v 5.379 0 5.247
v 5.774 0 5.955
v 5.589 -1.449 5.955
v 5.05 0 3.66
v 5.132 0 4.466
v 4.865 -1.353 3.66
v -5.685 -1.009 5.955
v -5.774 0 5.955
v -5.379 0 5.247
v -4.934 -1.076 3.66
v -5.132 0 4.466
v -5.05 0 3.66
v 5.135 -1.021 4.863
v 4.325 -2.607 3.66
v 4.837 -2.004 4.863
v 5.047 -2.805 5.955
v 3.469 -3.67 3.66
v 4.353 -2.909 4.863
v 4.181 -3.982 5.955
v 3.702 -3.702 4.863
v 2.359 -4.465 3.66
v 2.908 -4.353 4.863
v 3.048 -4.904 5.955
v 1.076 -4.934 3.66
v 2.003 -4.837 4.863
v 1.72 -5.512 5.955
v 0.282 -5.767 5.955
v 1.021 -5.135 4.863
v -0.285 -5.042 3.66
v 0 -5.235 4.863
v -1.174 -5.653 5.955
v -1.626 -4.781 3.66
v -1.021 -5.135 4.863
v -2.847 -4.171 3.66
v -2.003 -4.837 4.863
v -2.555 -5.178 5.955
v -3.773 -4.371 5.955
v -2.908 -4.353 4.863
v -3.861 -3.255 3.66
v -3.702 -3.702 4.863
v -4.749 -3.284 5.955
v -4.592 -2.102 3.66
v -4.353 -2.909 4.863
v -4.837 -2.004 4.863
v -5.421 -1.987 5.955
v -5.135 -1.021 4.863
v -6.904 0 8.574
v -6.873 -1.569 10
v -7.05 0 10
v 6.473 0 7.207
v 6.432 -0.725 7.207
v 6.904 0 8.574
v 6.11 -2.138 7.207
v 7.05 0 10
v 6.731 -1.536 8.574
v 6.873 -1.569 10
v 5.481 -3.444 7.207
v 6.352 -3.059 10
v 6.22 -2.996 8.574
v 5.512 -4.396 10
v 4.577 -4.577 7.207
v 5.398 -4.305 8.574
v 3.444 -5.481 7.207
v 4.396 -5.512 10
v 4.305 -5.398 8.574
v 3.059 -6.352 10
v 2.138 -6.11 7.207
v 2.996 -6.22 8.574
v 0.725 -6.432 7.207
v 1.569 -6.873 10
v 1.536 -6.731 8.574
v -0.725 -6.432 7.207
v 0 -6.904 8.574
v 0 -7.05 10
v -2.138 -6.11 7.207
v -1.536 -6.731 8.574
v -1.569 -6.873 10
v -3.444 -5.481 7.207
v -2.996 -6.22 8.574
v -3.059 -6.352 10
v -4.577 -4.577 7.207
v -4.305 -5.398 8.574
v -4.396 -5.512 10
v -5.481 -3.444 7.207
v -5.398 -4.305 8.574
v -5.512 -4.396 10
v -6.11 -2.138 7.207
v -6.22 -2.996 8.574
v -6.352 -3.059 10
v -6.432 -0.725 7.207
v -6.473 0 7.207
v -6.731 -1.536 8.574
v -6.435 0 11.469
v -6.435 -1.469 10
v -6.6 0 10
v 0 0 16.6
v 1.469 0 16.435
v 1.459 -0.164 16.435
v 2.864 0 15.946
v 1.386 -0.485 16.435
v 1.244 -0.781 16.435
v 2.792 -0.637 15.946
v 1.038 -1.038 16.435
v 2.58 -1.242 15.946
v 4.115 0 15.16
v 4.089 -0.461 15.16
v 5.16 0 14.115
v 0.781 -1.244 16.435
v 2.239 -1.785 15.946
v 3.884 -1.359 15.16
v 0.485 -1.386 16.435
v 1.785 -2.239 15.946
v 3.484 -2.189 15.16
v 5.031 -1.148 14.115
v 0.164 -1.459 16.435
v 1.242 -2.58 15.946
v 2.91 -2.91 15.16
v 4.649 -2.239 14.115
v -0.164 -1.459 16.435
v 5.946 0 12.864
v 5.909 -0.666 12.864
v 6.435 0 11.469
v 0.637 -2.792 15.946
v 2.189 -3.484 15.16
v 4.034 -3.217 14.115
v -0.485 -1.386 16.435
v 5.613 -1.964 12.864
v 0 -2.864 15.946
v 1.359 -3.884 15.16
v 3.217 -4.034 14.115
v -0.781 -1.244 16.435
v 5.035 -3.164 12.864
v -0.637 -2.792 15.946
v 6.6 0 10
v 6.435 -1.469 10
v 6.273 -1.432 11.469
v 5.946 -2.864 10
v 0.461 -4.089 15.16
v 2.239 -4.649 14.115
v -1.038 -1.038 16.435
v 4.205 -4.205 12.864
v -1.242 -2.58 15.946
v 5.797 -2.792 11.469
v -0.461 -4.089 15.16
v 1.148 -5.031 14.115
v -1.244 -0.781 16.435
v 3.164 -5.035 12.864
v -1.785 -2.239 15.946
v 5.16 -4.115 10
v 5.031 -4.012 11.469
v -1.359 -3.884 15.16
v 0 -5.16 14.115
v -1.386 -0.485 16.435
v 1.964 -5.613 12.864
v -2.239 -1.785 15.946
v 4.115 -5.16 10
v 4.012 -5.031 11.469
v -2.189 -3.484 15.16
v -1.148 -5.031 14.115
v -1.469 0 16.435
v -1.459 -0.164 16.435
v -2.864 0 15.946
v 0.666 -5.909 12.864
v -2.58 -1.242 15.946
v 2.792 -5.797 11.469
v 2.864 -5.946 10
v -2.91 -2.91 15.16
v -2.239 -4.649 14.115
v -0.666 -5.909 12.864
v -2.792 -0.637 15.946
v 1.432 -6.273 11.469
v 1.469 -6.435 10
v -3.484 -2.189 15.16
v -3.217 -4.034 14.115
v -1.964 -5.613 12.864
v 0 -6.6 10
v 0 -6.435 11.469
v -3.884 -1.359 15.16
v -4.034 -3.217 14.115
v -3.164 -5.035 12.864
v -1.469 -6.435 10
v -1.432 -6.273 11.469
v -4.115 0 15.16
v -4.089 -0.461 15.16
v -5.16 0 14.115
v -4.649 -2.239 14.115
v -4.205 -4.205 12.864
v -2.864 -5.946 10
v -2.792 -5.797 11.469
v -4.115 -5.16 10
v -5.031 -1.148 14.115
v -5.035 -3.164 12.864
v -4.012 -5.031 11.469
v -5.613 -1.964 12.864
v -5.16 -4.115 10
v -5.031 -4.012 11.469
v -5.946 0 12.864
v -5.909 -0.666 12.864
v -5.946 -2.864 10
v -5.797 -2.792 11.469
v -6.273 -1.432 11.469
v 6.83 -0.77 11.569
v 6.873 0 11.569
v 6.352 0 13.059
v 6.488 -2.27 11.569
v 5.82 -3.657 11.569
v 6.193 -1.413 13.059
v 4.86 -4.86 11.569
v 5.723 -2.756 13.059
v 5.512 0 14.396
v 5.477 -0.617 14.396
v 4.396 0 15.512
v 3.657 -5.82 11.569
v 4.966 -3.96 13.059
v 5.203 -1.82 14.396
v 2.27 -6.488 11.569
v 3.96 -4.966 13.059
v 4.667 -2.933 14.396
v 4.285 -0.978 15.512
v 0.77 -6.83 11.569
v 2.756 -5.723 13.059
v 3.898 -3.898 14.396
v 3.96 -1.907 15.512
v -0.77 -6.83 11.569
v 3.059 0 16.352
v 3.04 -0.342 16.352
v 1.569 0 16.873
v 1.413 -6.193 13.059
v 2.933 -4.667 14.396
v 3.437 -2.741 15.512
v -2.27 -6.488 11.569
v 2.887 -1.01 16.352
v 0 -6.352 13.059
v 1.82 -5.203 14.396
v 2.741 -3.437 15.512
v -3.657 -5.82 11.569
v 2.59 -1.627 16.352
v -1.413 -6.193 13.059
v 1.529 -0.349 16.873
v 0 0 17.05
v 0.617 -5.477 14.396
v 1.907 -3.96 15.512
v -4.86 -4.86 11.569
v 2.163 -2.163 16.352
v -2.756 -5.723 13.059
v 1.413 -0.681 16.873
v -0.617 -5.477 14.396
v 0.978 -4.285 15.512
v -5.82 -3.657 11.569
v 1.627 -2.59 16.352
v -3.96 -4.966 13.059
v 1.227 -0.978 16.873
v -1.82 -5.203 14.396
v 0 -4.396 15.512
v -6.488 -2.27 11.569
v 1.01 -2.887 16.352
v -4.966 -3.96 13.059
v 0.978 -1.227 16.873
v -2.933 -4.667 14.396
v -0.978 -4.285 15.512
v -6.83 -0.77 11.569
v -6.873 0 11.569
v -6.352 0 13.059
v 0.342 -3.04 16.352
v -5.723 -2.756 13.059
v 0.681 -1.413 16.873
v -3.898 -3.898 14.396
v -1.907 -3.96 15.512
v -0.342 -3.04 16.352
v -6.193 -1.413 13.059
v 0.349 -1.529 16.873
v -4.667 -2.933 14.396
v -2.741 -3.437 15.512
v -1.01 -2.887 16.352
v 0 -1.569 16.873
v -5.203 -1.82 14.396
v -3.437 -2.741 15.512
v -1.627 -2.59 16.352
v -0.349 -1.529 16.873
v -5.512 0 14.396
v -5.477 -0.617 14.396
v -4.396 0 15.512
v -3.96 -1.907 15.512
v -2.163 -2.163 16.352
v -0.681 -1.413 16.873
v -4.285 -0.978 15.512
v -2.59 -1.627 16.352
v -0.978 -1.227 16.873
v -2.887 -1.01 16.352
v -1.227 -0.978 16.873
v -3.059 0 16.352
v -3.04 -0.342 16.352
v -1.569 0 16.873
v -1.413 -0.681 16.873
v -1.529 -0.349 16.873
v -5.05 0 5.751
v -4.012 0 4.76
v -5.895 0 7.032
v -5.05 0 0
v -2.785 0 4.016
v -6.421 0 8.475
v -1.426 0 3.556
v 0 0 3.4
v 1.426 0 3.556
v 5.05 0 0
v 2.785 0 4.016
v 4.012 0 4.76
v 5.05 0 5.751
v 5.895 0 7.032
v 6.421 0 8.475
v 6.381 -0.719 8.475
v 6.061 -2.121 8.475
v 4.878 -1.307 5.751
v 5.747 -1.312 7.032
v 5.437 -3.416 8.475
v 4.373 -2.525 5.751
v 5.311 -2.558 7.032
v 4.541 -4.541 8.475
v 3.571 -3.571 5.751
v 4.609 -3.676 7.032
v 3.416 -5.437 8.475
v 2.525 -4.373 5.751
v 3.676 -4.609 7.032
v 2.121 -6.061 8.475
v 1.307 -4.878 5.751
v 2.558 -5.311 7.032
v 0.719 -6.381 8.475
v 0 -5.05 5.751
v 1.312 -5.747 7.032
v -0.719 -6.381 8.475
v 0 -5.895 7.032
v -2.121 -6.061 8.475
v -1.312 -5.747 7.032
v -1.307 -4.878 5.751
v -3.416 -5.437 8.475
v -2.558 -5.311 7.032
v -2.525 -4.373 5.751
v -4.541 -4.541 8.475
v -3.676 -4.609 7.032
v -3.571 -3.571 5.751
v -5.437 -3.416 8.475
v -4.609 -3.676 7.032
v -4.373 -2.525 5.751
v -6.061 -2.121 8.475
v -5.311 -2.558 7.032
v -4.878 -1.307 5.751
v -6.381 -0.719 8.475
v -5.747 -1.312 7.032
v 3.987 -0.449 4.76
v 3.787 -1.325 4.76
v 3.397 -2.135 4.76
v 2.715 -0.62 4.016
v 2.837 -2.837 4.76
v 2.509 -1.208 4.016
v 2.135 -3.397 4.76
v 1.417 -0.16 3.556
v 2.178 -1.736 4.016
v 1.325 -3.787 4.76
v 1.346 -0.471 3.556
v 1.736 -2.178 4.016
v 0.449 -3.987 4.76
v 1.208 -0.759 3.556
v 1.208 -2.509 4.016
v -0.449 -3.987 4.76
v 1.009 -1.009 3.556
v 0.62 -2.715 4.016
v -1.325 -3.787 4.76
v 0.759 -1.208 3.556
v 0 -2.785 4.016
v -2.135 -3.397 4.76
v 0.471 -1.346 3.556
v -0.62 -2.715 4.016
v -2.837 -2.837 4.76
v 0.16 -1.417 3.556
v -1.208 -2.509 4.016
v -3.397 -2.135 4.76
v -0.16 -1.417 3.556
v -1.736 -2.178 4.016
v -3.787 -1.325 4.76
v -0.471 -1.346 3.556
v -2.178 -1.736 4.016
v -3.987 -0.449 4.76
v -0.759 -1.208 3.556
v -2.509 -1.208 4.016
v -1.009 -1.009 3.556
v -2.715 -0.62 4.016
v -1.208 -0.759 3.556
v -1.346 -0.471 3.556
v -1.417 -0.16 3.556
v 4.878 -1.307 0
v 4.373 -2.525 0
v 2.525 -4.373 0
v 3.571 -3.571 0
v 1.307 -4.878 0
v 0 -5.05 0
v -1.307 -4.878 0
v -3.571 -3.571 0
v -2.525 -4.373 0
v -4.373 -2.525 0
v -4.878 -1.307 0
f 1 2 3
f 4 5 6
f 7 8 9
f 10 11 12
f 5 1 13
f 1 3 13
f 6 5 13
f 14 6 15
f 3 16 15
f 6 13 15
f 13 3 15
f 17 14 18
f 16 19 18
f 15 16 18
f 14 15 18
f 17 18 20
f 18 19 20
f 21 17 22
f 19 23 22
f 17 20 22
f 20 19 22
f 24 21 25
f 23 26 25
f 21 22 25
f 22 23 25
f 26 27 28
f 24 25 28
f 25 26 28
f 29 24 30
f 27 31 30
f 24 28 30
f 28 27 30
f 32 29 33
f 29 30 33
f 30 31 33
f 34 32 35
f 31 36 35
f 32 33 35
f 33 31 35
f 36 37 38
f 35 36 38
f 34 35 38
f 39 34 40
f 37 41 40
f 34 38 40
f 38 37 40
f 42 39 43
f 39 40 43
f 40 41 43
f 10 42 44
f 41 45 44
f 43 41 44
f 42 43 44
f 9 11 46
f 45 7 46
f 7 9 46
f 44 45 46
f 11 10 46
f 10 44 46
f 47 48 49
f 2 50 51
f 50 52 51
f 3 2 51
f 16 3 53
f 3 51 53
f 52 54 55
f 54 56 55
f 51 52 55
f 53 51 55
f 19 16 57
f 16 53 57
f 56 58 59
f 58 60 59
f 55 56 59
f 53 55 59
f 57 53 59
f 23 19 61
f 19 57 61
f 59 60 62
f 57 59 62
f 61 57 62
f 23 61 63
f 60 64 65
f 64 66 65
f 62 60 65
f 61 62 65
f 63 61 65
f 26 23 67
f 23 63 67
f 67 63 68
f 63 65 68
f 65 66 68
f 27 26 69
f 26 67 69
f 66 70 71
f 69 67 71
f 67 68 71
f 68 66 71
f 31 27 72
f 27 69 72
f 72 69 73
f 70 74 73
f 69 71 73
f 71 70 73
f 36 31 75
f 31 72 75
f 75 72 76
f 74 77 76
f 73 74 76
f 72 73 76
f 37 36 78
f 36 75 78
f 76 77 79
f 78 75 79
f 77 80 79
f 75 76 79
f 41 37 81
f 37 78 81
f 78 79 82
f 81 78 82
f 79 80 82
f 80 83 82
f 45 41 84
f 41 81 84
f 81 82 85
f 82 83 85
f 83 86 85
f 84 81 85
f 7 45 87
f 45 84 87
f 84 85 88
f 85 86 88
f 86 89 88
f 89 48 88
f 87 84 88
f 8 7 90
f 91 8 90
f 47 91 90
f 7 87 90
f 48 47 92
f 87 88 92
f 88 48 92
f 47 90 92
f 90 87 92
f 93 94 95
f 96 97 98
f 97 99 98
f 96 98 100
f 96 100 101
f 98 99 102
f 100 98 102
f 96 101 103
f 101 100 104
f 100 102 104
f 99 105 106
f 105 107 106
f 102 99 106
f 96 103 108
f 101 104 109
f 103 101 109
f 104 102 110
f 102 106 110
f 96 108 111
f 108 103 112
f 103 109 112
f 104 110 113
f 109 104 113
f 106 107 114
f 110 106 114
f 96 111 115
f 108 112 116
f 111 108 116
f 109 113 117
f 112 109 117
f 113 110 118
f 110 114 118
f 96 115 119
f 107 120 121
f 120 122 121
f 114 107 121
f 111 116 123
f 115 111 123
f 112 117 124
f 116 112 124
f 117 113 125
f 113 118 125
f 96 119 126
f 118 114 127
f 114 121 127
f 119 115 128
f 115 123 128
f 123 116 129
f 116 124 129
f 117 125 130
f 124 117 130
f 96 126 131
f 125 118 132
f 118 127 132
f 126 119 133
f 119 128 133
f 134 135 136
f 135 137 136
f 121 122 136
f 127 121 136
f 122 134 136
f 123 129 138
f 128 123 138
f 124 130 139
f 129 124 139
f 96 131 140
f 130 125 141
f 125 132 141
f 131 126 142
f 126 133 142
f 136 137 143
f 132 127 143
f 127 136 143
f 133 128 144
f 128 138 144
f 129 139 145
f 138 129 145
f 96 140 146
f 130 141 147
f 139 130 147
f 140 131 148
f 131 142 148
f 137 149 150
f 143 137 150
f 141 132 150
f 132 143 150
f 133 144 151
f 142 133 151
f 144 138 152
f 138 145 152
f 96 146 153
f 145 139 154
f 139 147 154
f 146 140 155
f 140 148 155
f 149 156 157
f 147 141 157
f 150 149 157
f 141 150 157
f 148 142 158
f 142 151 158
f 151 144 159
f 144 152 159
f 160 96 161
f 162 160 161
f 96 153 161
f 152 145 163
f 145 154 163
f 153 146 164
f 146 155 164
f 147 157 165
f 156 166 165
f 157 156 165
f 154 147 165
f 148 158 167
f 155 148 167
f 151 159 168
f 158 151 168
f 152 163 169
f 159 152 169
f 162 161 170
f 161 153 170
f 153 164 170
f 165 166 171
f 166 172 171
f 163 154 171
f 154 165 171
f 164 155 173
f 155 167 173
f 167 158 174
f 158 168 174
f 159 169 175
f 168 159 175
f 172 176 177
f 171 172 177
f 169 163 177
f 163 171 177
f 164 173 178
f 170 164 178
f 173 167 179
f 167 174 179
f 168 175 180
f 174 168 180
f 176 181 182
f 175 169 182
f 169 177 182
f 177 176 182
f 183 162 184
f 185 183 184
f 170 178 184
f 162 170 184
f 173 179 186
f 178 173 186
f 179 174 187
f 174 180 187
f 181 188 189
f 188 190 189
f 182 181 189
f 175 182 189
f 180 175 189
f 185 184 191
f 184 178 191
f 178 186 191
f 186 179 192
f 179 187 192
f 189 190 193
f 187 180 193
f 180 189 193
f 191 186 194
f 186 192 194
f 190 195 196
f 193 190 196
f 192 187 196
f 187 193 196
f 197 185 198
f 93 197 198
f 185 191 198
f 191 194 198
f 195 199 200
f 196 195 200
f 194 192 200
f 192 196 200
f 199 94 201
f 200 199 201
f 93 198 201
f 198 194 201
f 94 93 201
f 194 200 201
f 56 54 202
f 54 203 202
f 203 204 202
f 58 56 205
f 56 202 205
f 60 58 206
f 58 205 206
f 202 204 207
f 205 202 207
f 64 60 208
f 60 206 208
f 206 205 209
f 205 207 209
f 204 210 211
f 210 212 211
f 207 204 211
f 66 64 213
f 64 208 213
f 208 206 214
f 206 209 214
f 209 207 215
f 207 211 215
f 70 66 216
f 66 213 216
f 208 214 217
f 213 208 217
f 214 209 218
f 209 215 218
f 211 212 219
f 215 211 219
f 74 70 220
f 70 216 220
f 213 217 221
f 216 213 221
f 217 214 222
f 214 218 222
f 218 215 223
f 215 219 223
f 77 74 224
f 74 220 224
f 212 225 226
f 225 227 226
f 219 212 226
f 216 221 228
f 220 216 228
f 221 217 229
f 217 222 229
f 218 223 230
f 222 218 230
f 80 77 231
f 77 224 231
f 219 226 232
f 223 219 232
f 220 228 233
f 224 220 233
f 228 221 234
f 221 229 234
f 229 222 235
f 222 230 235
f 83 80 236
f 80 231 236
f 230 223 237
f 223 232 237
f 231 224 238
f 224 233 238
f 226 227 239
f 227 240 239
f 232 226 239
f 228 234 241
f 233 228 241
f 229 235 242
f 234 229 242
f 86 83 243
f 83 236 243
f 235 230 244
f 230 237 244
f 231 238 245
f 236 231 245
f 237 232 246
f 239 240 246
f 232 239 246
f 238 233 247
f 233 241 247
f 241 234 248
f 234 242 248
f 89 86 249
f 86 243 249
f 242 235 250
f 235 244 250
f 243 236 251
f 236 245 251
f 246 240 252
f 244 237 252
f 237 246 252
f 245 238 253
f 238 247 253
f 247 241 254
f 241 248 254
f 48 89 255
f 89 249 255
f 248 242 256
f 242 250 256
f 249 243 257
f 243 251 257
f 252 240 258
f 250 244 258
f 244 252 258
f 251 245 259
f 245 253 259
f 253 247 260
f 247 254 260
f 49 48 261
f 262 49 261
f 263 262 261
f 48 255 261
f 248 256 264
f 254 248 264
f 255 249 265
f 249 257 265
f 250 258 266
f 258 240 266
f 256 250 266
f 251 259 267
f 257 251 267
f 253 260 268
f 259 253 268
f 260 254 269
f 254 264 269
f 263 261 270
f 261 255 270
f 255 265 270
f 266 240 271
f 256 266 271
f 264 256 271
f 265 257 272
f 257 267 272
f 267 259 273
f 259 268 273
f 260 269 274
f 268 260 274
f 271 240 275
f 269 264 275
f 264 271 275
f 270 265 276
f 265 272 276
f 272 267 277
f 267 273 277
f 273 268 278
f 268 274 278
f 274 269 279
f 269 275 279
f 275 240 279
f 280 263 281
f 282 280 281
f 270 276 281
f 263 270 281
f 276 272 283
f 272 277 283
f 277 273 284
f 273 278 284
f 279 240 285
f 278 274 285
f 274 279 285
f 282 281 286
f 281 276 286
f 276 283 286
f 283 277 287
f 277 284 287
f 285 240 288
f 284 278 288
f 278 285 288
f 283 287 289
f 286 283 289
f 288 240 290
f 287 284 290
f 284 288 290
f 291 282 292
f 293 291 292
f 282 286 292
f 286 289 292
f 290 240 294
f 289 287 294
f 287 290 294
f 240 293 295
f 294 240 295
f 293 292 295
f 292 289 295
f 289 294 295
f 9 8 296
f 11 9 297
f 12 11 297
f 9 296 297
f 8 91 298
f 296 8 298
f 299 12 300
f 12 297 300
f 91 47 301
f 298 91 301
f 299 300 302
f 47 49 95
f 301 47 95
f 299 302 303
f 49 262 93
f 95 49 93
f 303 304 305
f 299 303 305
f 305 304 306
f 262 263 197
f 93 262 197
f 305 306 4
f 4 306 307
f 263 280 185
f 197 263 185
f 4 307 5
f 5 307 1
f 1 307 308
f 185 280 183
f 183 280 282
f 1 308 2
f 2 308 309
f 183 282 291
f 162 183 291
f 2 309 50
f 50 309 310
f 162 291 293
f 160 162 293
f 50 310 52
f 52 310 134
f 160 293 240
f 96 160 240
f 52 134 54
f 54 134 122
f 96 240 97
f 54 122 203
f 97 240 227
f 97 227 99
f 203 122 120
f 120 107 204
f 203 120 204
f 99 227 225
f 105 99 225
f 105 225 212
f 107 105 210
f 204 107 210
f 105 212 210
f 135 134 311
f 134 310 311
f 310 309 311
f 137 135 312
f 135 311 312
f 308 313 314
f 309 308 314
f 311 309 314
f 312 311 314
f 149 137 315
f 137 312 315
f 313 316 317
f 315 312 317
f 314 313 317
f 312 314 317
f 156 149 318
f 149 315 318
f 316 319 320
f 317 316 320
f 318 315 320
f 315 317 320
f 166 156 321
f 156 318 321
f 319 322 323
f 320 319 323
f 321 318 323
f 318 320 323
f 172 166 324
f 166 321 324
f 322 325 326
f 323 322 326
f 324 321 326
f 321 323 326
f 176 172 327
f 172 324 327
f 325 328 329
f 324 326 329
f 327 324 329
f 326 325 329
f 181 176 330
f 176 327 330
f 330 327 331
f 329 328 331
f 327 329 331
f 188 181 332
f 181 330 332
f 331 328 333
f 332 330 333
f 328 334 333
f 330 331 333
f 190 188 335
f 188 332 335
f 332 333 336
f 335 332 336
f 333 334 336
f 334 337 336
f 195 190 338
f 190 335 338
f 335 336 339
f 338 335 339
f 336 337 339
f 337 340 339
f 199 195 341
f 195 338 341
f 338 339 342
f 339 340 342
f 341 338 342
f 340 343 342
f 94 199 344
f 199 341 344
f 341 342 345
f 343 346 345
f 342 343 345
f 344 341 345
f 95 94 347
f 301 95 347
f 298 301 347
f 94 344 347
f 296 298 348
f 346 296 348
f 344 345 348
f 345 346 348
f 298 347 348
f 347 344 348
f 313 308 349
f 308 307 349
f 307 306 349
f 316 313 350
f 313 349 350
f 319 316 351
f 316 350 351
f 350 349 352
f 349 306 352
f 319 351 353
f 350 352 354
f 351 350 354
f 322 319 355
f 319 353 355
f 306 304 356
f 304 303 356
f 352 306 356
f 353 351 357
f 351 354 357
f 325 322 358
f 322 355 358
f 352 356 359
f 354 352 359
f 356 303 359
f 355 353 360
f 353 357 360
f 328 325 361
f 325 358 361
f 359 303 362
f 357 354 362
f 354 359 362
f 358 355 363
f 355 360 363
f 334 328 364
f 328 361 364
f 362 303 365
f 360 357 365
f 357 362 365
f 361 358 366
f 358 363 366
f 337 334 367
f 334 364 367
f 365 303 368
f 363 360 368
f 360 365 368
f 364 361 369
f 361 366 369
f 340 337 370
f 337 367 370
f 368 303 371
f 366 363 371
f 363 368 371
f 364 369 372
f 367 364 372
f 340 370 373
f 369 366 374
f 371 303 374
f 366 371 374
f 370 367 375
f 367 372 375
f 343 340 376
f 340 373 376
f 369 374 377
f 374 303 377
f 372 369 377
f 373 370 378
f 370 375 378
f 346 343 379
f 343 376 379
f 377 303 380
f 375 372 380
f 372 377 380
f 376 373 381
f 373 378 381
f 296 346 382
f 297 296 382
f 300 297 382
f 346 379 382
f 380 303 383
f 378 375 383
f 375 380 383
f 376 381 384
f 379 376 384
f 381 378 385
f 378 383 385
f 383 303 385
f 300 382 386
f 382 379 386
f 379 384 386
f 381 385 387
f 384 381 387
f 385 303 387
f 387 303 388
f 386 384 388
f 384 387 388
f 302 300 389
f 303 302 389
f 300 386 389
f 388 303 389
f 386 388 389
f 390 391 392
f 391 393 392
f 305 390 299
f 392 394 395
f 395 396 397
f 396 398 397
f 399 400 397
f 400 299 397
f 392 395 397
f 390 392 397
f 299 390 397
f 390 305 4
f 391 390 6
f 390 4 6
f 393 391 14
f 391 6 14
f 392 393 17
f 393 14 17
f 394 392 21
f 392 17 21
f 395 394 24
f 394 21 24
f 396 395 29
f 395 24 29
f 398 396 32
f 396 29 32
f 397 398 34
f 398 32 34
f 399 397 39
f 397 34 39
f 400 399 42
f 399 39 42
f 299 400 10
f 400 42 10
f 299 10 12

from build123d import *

# Parameters (mm, degrees)
F1_ANGLE = 180
F2_R     = 4


with BuildPart() as f1:
    # F0 (on Front) → F1 (revolve)
    with BuildSketch(Plane.XZ):
        with BuildLine():
            ThreePointArc((0, 16.6), (4.6669047558, 14.6669047558), (6.6, 10))
            ThreePointArc((6.6, 10), (6.2004032127, 7.7383634244), (5.05, 5.750588276))
            Line((5.05, 5.750588276), (5.05, 5.0806504495))
            ThreePointArc((5.05, 5.0806504495), (6.5308881479, 7.3448163905), (7.05, 10))
            ThreePointArc((7.05, 10), (4.9851028074, 14.9851028074), (0, 17.05))
            Line((0, 17.05), (0, 16.6))
        make_face()
        with BuildLine():
            Line((5.05, 5.0806504495), (5.05, 5.750588276))
            ThreePointArc((5.05, 5.750588276), (2.7851285986, 4.016434283), (0, 3.4))
            Line((0, 3.4), (0, 2.95))
            ThreePointArc((0, 2.95), (2.740536961, 3.5044663679), (5.05, 5.0806504495))
        make_face()
        with BuildLine():
            Line((5.05, 0), (5.05, 5.0806504495))
            ThreePointArc((5.05, 5.0806504495), (2.740536961, 3.5044663679), (0, 2.95))
            Line((0, 2.95), (0, 0))
            Line((0, 0), (5.05, 0))
        make_face()
    revolve(axis=Axis((0, 0, 10), (0, 0, -1)), revolution_arc=F1_ANGLE)

    # F2
    f2_edges = [f1.edges().sort_by_distance(p)[0] for p in [
        (0, -5.05, 5.08065),
    ]]
    fillet(f2_edges, radius=F2_R)


solid = f1.part
